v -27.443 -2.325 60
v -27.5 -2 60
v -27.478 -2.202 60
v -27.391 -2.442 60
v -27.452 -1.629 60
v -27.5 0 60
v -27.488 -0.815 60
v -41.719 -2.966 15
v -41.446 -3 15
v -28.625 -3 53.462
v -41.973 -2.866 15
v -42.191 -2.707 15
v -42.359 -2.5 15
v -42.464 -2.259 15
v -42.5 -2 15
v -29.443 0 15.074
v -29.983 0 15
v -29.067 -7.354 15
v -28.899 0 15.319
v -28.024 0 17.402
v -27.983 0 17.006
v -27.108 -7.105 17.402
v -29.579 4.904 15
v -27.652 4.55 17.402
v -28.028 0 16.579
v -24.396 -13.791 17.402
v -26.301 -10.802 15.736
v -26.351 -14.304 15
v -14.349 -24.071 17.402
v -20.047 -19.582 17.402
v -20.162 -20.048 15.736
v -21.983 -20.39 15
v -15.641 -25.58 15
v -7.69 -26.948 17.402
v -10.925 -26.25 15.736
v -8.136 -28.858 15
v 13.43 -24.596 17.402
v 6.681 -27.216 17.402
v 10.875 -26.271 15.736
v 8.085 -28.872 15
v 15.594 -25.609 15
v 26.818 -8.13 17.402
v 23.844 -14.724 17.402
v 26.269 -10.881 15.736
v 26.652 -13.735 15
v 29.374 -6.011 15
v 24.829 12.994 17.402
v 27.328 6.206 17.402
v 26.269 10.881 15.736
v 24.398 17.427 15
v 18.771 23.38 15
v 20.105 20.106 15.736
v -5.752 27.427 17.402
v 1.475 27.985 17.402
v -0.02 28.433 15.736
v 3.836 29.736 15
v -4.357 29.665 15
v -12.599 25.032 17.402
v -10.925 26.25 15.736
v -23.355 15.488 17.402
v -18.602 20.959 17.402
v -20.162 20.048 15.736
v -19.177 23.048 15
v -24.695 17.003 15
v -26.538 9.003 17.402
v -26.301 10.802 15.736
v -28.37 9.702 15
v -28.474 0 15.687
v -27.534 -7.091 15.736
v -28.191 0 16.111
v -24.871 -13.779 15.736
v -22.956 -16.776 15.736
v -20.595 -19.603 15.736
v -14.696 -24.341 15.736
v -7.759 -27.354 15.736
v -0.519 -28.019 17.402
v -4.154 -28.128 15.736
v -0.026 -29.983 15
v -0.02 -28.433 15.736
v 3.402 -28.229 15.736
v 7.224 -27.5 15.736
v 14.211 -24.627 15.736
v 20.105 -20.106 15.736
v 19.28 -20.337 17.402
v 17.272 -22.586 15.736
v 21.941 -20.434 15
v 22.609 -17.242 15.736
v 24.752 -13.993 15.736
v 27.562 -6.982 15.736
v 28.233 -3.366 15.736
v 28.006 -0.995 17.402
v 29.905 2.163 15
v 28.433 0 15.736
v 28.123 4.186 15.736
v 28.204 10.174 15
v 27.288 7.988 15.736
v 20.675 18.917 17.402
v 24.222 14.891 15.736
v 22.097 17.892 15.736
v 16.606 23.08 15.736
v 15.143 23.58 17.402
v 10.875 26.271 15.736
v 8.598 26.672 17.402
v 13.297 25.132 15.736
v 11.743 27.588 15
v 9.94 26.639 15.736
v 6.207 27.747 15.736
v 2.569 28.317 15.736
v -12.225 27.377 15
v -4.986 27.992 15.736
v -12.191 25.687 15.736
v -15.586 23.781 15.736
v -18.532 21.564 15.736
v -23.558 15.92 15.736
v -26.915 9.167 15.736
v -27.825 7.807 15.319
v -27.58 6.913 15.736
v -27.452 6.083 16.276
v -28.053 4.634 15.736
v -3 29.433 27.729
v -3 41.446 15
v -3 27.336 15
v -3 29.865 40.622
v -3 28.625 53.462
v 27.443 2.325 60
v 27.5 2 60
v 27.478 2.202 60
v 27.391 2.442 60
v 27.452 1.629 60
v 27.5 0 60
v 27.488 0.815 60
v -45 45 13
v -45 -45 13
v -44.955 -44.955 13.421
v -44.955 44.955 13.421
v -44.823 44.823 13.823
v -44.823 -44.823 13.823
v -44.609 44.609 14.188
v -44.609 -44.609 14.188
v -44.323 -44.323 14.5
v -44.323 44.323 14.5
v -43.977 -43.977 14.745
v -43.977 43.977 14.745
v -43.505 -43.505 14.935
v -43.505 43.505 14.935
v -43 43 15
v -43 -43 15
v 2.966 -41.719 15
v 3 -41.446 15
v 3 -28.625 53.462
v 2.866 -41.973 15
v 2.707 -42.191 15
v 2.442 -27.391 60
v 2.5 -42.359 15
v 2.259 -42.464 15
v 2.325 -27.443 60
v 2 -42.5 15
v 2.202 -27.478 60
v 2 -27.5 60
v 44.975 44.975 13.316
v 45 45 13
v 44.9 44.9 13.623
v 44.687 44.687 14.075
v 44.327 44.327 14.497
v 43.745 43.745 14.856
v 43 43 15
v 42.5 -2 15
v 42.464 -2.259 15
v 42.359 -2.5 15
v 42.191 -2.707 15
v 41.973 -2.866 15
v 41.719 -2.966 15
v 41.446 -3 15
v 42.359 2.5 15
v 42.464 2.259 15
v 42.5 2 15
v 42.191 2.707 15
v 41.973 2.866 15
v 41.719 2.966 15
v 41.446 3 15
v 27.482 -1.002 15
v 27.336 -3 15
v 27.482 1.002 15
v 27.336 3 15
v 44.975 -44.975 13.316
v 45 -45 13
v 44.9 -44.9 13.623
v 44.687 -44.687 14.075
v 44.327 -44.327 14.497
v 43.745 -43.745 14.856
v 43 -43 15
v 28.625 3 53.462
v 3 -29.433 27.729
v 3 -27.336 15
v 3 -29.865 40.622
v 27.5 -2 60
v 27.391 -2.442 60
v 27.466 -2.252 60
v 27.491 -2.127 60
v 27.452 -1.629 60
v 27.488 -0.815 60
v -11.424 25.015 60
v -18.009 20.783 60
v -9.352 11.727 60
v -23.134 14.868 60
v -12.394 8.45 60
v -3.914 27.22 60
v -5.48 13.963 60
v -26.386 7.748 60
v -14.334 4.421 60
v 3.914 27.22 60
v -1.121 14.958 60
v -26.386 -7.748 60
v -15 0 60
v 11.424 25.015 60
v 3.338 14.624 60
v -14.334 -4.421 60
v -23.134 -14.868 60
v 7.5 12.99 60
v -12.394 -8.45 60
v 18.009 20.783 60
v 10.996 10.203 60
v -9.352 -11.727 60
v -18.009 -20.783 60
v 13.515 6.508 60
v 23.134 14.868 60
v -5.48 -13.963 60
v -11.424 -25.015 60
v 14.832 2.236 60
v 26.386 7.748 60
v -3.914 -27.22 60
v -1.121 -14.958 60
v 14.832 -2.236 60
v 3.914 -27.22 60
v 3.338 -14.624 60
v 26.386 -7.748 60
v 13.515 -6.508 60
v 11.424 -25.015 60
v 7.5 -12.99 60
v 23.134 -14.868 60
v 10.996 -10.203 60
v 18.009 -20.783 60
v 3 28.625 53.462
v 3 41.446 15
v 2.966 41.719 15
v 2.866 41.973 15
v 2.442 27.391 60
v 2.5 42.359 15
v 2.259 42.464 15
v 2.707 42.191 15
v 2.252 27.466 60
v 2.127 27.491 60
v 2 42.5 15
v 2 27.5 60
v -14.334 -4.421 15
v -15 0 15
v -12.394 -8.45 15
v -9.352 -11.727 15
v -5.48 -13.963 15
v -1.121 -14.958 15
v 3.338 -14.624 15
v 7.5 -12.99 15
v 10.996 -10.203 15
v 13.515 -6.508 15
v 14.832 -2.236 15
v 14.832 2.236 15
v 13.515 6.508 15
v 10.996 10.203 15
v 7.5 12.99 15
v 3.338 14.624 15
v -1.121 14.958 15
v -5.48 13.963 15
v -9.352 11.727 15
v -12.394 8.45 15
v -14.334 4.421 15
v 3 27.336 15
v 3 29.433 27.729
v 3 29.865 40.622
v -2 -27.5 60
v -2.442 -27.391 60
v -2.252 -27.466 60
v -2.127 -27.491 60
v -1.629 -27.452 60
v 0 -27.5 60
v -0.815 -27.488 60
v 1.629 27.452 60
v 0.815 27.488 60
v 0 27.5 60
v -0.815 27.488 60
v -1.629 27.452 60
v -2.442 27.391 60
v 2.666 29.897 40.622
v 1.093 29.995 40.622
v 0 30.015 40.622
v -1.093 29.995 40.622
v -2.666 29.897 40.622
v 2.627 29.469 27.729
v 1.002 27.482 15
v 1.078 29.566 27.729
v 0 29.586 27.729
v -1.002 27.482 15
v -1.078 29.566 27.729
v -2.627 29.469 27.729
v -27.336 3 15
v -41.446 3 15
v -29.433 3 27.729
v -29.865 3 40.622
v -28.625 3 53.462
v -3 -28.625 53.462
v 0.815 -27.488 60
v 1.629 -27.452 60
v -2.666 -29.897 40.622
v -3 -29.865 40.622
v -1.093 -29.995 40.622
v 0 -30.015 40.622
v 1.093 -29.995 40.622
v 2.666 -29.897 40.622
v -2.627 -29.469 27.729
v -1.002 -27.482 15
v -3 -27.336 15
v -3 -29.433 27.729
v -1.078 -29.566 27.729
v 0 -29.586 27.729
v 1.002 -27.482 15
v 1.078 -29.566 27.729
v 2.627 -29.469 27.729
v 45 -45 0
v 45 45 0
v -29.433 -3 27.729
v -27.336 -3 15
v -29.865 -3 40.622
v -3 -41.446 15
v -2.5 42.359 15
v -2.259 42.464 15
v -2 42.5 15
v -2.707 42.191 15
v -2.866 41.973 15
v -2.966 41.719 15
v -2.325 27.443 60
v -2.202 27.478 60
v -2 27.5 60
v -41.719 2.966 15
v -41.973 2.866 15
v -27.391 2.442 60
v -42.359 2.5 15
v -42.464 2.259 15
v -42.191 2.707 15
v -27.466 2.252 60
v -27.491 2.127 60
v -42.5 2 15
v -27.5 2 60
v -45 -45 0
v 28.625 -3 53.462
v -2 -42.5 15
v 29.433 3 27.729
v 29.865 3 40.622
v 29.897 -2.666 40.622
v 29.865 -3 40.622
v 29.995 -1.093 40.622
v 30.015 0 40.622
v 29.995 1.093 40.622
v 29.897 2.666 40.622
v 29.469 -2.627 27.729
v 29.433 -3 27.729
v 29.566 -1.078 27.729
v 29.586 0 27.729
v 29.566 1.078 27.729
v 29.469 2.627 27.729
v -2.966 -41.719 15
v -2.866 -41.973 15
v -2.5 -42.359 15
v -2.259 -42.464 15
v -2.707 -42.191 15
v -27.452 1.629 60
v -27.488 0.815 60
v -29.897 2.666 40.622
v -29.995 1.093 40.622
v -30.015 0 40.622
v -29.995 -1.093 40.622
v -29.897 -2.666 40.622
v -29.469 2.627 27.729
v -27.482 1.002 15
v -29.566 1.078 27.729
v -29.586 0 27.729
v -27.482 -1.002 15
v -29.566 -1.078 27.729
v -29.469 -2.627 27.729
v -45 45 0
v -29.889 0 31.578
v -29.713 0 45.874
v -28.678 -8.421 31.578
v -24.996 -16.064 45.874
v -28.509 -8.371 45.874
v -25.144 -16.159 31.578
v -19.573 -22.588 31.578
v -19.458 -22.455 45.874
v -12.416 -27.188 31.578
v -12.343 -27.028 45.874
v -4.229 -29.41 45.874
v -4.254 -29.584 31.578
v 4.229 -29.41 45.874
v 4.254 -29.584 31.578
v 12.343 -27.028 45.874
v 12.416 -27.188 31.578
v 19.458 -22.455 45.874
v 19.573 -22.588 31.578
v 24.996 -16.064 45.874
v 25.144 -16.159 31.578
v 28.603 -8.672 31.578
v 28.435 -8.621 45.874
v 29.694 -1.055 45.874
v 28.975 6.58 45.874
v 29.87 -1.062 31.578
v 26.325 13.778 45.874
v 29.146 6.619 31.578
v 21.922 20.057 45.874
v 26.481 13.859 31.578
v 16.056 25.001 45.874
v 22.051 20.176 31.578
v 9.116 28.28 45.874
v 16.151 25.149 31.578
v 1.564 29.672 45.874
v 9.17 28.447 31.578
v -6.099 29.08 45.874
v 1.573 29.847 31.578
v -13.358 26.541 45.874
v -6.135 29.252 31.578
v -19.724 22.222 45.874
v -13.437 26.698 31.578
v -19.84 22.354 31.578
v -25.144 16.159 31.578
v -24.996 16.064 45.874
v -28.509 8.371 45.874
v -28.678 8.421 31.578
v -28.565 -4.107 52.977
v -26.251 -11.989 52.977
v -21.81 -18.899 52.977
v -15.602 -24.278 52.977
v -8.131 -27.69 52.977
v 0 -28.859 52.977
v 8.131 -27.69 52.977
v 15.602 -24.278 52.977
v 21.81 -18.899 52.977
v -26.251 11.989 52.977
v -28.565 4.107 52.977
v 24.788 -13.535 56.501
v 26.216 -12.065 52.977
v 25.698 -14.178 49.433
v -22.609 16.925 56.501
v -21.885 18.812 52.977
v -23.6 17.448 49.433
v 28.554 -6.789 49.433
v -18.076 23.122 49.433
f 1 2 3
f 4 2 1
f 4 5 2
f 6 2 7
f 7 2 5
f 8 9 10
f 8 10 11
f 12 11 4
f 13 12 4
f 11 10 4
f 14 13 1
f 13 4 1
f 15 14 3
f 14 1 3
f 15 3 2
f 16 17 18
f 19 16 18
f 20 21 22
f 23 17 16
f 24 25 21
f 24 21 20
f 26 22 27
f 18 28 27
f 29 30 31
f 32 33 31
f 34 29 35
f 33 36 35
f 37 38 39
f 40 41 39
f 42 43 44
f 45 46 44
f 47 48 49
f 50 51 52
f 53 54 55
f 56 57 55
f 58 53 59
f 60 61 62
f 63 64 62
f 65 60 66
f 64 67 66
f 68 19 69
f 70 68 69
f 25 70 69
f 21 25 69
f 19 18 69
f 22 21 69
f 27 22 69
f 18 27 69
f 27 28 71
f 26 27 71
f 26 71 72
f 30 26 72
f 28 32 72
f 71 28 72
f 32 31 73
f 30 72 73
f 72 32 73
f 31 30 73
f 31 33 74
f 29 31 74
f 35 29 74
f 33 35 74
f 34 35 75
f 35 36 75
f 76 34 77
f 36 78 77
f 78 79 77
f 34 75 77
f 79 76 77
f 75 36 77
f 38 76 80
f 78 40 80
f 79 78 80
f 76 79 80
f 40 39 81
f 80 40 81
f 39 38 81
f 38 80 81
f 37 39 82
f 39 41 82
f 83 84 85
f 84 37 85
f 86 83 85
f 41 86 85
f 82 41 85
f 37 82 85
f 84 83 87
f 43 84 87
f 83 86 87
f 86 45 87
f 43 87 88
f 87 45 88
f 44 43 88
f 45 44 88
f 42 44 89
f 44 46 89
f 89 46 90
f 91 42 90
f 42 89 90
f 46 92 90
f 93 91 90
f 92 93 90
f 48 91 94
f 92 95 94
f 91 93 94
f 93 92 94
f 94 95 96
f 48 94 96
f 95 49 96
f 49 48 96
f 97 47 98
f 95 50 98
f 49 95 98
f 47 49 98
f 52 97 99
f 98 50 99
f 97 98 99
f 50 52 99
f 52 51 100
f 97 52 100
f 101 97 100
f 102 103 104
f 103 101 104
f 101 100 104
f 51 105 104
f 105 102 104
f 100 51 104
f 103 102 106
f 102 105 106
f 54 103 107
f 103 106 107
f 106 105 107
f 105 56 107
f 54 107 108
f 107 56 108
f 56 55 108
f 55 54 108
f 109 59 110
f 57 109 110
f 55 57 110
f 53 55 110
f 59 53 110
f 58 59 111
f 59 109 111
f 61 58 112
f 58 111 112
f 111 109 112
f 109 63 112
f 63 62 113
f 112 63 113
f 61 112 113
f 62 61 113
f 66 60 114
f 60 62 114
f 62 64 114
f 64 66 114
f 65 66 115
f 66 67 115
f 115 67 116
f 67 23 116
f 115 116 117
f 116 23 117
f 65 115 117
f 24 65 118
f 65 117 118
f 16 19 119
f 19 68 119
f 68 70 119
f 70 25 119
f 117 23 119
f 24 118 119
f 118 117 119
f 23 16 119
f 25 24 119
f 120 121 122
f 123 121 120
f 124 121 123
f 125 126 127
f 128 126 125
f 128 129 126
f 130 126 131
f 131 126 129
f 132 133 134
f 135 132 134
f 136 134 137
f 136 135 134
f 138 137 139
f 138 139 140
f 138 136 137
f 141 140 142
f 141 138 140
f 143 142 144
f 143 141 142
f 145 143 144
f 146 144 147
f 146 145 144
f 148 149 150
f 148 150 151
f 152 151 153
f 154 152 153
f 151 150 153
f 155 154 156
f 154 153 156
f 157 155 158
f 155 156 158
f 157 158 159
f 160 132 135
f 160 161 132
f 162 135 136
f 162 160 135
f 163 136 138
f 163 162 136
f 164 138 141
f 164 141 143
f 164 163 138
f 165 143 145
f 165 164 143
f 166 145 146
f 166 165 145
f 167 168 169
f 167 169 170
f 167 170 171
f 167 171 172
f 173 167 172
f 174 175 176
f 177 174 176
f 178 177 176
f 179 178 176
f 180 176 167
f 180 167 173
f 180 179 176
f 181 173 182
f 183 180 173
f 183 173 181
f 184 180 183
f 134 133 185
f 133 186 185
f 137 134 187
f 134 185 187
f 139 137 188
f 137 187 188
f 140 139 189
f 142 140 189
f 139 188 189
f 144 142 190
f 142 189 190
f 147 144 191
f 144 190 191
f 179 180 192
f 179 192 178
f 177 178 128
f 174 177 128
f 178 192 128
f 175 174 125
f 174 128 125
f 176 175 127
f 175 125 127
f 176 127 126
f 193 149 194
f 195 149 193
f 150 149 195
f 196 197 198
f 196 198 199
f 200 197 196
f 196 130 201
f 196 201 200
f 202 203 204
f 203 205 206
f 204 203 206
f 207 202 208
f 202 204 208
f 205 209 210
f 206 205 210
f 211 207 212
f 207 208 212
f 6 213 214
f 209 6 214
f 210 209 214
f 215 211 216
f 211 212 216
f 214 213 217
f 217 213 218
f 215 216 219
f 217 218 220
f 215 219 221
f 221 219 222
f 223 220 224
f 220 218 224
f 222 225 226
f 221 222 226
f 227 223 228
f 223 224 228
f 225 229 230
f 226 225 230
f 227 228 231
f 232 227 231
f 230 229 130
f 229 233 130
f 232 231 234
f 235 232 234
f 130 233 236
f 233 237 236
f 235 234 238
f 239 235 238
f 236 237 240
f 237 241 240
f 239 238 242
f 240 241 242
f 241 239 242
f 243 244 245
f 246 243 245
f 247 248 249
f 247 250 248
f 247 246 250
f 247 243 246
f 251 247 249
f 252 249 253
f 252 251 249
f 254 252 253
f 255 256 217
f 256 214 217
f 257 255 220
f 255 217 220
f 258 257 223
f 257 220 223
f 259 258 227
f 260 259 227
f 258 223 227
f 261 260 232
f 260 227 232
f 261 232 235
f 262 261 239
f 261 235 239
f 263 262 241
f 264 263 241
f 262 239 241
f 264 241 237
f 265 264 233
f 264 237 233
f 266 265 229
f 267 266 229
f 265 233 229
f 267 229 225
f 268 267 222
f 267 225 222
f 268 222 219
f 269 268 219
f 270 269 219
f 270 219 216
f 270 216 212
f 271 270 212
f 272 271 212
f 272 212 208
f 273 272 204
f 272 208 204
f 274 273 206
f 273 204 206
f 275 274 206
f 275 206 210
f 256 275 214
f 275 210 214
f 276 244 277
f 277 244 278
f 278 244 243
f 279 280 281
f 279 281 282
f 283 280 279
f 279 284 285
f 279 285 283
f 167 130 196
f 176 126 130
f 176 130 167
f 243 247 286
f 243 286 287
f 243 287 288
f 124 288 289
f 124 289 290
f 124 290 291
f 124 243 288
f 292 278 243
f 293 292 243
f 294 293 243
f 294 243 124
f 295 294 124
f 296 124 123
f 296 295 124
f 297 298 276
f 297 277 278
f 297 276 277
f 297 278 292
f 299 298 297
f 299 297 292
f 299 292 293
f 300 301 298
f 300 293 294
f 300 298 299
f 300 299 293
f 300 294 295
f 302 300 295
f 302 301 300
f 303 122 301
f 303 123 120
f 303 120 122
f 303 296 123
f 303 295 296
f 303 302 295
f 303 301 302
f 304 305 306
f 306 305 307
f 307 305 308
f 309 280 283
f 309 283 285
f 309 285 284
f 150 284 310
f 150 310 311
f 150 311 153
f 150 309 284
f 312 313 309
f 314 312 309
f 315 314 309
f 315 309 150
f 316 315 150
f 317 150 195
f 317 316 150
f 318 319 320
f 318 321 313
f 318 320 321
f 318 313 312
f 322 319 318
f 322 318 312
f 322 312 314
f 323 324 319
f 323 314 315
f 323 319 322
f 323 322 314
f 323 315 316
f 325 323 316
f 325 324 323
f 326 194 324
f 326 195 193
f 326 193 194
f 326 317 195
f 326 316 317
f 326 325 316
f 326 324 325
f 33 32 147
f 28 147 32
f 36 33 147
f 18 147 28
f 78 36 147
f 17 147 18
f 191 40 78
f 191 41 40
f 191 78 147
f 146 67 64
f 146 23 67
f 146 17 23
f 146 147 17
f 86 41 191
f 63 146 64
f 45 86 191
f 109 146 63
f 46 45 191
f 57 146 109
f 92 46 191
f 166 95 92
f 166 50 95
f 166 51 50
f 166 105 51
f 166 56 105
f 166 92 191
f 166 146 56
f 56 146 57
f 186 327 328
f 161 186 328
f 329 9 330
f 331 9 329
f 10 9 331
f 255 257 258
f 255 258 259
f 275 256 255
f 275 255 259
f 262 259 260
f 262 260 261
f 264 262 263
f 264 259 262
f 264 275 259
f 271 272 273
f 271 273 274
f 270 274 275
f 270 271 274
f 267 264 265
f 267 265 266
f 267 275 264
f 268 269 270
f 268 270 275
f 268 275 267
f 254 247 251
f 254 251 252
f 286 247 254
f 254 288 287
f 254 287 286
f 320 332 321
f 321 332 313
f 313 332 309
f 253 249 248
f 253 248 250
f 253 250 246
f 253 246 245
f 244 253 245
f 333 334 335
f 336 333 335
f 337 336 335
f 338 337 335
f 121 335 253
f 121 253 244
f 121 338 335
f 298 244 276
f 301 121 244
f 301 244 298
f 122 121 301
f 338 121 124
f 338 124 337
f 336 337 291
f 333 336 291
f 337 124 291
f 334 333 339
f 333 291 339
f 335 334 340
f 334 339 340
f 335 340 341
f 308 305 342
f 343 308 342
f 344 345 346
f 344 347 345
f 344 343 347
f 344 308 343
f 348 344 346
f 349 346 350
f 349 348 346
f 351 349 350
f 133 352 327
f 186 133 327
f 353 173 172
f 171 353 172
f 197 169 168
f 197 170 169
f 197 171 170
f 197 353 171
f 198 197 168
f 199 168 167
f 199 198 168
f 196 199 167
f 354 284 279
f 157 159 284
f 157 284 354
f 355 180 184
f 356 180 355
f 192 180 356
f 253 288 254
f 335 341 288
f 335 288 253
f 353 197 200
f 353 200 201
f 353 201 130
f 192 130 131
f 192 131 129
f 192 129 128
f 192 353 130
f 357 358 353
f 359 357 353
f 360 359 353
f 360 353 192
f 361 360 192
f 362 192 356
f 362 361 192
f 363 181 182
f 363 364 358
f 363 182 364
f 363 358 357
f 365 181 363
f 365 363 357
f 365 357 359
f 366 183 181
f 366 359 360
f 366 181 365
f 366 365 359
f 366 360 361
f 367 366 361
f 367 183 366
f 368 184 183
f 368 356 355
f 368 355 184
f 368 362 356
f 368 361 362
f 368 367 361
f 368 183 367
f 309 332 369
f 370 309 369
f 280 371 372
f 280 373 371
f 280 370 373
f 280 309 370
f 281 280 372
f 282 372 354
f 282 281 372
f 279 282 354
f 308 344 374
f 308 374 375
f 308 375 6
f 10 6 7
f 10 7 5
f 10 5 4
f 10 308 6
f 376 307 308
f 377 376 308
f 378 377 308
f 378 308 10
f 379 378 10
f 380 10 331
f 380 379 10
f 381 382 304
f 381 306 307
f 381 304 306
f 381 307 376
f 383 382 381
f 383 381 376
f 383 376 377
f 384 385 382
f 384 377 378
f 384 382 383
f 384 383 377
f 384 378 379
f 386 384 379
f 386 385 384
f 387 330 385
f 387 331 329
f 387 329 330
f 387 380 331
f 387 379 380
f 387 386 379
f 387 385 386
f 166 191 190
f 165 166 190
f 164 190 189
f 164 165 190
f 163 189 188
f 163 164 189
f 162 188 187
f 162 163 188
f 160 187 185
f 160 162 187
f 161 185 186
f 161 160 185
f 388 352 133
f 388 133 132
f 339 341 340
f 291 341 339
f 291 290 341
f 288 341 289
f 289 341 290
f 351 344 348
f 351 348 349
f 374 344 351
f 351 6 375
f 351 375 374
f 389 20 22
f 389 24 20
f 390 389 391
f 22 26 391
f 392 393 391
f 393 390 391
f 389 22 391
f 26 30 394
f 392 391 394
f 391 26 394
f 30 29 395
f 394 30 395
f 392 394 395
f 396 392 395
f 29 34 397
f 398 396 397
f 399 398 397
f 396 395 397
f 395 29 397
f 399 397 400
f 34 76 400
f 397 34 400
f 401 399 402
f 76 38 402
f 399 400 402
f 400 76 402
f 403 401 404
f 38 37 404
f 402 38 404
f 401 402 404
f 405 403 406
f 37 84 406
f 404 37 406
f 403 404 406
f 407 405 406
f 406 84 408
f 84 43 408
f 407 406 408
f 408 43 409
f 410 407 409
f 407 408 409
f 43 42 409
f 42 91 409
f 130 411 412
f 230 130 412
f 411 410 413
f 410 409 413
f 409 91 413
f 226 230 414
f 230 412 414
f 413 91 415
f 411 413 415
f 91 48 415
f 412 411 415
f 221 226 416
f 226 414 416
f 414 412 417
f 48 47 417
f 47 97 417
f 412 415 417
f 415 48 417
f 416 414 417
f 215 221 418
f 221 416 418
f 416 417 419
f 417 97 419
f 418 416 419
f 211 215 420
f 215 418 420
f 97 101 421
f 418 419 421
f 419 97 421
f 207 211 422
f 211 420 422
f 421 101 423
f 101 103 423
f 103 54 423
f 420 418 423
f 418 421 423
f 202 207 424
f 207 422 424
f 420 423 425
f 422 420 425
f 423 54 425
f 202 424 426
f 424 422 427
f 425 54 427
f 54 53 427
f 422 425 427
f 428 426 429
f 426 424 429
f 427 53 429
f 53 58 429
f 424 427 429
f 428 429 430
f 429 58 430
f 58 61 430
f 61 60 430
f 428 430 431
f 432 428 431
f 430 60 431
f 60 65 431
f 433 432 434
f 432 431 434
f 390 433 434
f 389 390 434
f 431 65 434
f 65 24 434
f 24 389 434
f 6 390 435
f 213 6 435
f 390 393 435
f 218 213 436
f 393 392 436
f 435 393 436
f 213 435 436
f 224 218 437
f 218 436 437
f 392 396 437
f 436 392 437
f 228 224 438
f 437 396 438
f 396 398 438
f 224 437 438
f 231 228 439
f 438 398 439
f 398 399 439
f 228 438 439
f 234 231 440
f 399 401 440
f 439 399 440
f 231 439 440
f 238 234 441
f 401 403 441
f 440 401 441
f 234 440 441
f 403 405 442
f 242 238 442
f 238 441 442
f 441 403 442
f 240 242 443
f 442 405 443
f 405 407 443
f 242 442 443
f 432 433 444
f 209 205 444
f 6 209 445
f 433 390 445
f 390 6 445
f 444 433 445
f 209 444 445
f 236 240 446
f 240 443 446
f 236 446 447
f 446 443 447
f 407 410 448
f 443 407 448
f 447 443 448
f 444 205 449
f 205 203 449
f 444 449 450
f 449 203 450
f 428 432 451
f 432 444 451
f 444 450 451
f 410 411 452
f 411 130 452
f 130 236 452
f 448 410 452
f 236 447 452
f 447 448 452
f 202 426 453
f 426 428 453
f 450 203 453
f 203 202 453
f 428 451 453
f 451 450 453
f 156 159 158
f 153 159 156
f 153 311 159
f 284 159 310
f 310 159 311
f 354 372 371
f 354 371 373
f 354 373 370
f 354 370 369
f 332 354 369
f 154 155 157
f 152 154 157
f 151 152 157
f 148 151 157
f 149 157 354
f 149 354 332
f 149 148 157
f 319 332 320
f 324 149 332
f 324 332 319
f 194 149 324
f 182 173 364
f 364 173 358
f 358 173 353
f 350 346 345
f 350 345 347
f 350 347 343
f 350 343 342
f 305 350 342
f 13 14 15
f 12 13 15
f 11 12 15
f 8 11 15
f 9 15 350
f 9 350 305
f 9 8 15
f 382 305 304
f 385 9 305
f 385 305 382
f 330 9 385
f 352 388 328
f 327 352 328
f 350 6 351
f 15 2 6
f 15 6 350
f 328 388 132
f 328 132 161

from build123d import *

# Parameters (mm, degrees)
F0_W           = 90
F0_H           = 90
F1_DEPTH       = 15
F5_DEPTH       = 3
F7_COUNT       = 4
F8_R           = 2
F9_T1_DEPTH    = 52.4341649025
F10_T1_DEPTH   = 52.4341649025
F10_2_T1_DEPTH = 52.4341649025
F10_3_T1_DEPTH = 52.4341649025


# Not quite as in the source:
# - a fillet or chamfer that OpenCascade refuses, or shapes differently, is made with other operations: its cross-section is extruded or revolved along the edge and cut away or added


with BuildPart() as f1:
    # F0 (on Top) → F1 (new body)
    with BuildSketch(Plane.XY):
        Rectangle(F0_W, F0_H)
    extrude(amount=F1_DEPTH)

    # F2 (on Front) → F3 (revolve)
    with BuildSketch(Plane.XZ):
        with BuildLine():
            Line((-27.5, 15), (-15, 15))
            Line((-15, 15), (-15, 60))
            Line((-15, 60), (-27.5, 60))
            ThreePointArc((-27.5, 60), (-30.0641236505, 37.5), (-27.5, 15))
        make_face()
    revolve(axis=Axis((0, 0, 27.5), (0, 0, 1)))


with BuildPart() as f5:
    # F4 (on Front) → F5 (new body, symmetric)
    with BuildSketch(Plane.XZ):
        Polygon((-42.5, 15), (-22.5, 15), (-22.5, 60), (-27.5, 60), align=None)
    extrude(amount=F5_DEPTH, both=True)

    # F6: cut F1
    add(f1.part, mode=Mode.SUBTRACT)


with BuildPart() as f7_1:
    # F7: instance of F5
    add(f5.part.rotate(Axis((0, 0, 27.5), (0, 0, 1)), 1 * 360 / F7_COUNT))

    # F10#3: fillet of radius 1 on 2 edges, made by hand

    # F10_3_s2 → F10_3_t1 (cut)
    with BuildSketch(Plane(origin=(0, 16.040569415, 48.1217082451), x_dir=(1, 0, 0), z_dir=(0, -0.316227766, -0.9486832981))):
        with BuildLine():
            ThreePointArc((3, 44.0624566574), (2.7071067812, 44.7695634386), (2, 45.0624566574))
            Line((2, 45.0624566574), (3, 45.0624566574))
            Line((3, 45.0624566574), (3, 44.0624566574))
        make_face()
        with BuildLine():
            ThreePointArc((-3, 44.0624566574), (-2.7071067812, 44.7695634386), (-2, 45.0624566574))
            Line((-2, 45.0624566574), (-3, 45.0624566574))
            Line((-3, 45.0624566574), (-3, 44.0624566574))
        make_face()
    extrude(amount=F10_3_T1_DEPTH, mode=Mode.SUBTRACT)


with BuildPart() as f7_2:
    # F7: instance of F5
    add(f5.part.rotate(Axis((0, 0, 27.5), (0, 0, 1)), 2 * 360 / F7_COUNT))

    # F10#2: fillet of radius 1 on 2 edges, made by hand

    # F10_2_s2 → F10_2_t1 (cut)
    with BuildSketch(Plane(origin=(-16.040569415, 0, 48.1217082451), x_dir=(0, 1, 0), z_dir=(0.316227766, 0, -0.9486832981))):
        with BuildLine():
            ThreePointArc((-3, 44.0624566574), (-2.7071067812, 44.7695634386), (-2, 45.0624566574))
            Line((-2, 45.0624566574), (-3, 45.0624566574))
            Line((-3, 45.0624566574), (-3, 44.0624566574))
        make_face()
        with BuildLine():
            ThreePointArc((3, 44.0624566574), (2.7071067812, 44.7695634386), (2, 45.0624566574))
            Line((2, 45.0624566574), (3, 45.0624566574))
            Line((3, 45.0624566574), (3, 44.0624566574))
        make_face()
    extrude(amount=F10_2_T1_DEPTH, mode=Mode.SUBTRACT)


with BuildPart() as f7_3:
    # F7: instance of F5
    add(f5.part.rotate(Axis((0, 0, 27.5), (0, 0, 1)), 3 * 360 / F7_COUNT))

    # F10: fillet of radius 1 on 2 edges, made by hand

    # F10_s2 → F10_t1 (cut)
    with BuildSketch(Plane(origin=(0, -16.040569415, 48.1217082451), x_dir=(1, 0, 0), z_dir=(0, 0.316227766, -0.9486832981))):
        with BuildLine():
            ThreePointArc((-3, -44.0624566574), (-2.7071067812, -44.7695634386), (-2, -45.0624566574))
            Line((-2, -45.0624566574), (-3, -45.0624566574))
            Line((-3, -45.0624566574), (-3, -44.0624566574))
        make_face()
        with BuildLine():
            ThreePointArc((3, -44.0624566574), (2.7071067812, -44.7695634386), (2, -45.0624566574))
            Line((2, -45.0624566574), (3, -45.0624566574))
            Line((3, -45.0624566574), (3, -44.0624566574))
        make_face()
    extrude(amount=F10_T1_DEPTH, mode=Mode.SUBTRACT)


with BuildPart() as f1_1:
    add(f1.part)

    # F8
    f8_edges = [f1_1.edges().sort_by_distance(p)[0] for p in [
        (45, 0, 15),
        (0, -45, 15),
        (0, 45, 15),
        (-45, 0, 15),
        (27.5, 0, 15),
    ]]
    fillet(f8_edges, radius=F8_R)


with BuildPart() as f5_1:
    add(f5.part)

    # F9: fillet of radius 1 on 2 edges, made by hand

    # F9_s2 → F9_t1 (cut)
    with BuildSketch(Plane(origin=(16.040569415, 0, 48.1217082451), x_dir=(0, 1, 0), z_dir=(-0.316227766, 0, -0.9486832981))):
        with BuildLine():
            ThreePointArc((3, -44.0624566574), (2.7071067812, -44.7695634386), (2, -45.0624566574))
            Line((2, -45.0624566574), (3, -45.0624566574))
            Line((3, -45.0624566574), (3, -44.0624566574))
        make_face()
        with BuildLine():
            ThreePointArc((-3, -44.0624566574), (-2.7071067812, -44.7695634386), (-2, -45.0624566574))
            Line((-2, -45.0624566574), (-3, -45.0624566574))
            Line((-3, -45.0624566574), (-3, -44.0624566574))
        make_face()
    extrude(amount=F9_T1_DEPTH, mode=Mode.SUBTRACT)


solid = Compound([f7_1.part, f7_2.part, f7_3.part, f1_1.part, f5_1.part])
